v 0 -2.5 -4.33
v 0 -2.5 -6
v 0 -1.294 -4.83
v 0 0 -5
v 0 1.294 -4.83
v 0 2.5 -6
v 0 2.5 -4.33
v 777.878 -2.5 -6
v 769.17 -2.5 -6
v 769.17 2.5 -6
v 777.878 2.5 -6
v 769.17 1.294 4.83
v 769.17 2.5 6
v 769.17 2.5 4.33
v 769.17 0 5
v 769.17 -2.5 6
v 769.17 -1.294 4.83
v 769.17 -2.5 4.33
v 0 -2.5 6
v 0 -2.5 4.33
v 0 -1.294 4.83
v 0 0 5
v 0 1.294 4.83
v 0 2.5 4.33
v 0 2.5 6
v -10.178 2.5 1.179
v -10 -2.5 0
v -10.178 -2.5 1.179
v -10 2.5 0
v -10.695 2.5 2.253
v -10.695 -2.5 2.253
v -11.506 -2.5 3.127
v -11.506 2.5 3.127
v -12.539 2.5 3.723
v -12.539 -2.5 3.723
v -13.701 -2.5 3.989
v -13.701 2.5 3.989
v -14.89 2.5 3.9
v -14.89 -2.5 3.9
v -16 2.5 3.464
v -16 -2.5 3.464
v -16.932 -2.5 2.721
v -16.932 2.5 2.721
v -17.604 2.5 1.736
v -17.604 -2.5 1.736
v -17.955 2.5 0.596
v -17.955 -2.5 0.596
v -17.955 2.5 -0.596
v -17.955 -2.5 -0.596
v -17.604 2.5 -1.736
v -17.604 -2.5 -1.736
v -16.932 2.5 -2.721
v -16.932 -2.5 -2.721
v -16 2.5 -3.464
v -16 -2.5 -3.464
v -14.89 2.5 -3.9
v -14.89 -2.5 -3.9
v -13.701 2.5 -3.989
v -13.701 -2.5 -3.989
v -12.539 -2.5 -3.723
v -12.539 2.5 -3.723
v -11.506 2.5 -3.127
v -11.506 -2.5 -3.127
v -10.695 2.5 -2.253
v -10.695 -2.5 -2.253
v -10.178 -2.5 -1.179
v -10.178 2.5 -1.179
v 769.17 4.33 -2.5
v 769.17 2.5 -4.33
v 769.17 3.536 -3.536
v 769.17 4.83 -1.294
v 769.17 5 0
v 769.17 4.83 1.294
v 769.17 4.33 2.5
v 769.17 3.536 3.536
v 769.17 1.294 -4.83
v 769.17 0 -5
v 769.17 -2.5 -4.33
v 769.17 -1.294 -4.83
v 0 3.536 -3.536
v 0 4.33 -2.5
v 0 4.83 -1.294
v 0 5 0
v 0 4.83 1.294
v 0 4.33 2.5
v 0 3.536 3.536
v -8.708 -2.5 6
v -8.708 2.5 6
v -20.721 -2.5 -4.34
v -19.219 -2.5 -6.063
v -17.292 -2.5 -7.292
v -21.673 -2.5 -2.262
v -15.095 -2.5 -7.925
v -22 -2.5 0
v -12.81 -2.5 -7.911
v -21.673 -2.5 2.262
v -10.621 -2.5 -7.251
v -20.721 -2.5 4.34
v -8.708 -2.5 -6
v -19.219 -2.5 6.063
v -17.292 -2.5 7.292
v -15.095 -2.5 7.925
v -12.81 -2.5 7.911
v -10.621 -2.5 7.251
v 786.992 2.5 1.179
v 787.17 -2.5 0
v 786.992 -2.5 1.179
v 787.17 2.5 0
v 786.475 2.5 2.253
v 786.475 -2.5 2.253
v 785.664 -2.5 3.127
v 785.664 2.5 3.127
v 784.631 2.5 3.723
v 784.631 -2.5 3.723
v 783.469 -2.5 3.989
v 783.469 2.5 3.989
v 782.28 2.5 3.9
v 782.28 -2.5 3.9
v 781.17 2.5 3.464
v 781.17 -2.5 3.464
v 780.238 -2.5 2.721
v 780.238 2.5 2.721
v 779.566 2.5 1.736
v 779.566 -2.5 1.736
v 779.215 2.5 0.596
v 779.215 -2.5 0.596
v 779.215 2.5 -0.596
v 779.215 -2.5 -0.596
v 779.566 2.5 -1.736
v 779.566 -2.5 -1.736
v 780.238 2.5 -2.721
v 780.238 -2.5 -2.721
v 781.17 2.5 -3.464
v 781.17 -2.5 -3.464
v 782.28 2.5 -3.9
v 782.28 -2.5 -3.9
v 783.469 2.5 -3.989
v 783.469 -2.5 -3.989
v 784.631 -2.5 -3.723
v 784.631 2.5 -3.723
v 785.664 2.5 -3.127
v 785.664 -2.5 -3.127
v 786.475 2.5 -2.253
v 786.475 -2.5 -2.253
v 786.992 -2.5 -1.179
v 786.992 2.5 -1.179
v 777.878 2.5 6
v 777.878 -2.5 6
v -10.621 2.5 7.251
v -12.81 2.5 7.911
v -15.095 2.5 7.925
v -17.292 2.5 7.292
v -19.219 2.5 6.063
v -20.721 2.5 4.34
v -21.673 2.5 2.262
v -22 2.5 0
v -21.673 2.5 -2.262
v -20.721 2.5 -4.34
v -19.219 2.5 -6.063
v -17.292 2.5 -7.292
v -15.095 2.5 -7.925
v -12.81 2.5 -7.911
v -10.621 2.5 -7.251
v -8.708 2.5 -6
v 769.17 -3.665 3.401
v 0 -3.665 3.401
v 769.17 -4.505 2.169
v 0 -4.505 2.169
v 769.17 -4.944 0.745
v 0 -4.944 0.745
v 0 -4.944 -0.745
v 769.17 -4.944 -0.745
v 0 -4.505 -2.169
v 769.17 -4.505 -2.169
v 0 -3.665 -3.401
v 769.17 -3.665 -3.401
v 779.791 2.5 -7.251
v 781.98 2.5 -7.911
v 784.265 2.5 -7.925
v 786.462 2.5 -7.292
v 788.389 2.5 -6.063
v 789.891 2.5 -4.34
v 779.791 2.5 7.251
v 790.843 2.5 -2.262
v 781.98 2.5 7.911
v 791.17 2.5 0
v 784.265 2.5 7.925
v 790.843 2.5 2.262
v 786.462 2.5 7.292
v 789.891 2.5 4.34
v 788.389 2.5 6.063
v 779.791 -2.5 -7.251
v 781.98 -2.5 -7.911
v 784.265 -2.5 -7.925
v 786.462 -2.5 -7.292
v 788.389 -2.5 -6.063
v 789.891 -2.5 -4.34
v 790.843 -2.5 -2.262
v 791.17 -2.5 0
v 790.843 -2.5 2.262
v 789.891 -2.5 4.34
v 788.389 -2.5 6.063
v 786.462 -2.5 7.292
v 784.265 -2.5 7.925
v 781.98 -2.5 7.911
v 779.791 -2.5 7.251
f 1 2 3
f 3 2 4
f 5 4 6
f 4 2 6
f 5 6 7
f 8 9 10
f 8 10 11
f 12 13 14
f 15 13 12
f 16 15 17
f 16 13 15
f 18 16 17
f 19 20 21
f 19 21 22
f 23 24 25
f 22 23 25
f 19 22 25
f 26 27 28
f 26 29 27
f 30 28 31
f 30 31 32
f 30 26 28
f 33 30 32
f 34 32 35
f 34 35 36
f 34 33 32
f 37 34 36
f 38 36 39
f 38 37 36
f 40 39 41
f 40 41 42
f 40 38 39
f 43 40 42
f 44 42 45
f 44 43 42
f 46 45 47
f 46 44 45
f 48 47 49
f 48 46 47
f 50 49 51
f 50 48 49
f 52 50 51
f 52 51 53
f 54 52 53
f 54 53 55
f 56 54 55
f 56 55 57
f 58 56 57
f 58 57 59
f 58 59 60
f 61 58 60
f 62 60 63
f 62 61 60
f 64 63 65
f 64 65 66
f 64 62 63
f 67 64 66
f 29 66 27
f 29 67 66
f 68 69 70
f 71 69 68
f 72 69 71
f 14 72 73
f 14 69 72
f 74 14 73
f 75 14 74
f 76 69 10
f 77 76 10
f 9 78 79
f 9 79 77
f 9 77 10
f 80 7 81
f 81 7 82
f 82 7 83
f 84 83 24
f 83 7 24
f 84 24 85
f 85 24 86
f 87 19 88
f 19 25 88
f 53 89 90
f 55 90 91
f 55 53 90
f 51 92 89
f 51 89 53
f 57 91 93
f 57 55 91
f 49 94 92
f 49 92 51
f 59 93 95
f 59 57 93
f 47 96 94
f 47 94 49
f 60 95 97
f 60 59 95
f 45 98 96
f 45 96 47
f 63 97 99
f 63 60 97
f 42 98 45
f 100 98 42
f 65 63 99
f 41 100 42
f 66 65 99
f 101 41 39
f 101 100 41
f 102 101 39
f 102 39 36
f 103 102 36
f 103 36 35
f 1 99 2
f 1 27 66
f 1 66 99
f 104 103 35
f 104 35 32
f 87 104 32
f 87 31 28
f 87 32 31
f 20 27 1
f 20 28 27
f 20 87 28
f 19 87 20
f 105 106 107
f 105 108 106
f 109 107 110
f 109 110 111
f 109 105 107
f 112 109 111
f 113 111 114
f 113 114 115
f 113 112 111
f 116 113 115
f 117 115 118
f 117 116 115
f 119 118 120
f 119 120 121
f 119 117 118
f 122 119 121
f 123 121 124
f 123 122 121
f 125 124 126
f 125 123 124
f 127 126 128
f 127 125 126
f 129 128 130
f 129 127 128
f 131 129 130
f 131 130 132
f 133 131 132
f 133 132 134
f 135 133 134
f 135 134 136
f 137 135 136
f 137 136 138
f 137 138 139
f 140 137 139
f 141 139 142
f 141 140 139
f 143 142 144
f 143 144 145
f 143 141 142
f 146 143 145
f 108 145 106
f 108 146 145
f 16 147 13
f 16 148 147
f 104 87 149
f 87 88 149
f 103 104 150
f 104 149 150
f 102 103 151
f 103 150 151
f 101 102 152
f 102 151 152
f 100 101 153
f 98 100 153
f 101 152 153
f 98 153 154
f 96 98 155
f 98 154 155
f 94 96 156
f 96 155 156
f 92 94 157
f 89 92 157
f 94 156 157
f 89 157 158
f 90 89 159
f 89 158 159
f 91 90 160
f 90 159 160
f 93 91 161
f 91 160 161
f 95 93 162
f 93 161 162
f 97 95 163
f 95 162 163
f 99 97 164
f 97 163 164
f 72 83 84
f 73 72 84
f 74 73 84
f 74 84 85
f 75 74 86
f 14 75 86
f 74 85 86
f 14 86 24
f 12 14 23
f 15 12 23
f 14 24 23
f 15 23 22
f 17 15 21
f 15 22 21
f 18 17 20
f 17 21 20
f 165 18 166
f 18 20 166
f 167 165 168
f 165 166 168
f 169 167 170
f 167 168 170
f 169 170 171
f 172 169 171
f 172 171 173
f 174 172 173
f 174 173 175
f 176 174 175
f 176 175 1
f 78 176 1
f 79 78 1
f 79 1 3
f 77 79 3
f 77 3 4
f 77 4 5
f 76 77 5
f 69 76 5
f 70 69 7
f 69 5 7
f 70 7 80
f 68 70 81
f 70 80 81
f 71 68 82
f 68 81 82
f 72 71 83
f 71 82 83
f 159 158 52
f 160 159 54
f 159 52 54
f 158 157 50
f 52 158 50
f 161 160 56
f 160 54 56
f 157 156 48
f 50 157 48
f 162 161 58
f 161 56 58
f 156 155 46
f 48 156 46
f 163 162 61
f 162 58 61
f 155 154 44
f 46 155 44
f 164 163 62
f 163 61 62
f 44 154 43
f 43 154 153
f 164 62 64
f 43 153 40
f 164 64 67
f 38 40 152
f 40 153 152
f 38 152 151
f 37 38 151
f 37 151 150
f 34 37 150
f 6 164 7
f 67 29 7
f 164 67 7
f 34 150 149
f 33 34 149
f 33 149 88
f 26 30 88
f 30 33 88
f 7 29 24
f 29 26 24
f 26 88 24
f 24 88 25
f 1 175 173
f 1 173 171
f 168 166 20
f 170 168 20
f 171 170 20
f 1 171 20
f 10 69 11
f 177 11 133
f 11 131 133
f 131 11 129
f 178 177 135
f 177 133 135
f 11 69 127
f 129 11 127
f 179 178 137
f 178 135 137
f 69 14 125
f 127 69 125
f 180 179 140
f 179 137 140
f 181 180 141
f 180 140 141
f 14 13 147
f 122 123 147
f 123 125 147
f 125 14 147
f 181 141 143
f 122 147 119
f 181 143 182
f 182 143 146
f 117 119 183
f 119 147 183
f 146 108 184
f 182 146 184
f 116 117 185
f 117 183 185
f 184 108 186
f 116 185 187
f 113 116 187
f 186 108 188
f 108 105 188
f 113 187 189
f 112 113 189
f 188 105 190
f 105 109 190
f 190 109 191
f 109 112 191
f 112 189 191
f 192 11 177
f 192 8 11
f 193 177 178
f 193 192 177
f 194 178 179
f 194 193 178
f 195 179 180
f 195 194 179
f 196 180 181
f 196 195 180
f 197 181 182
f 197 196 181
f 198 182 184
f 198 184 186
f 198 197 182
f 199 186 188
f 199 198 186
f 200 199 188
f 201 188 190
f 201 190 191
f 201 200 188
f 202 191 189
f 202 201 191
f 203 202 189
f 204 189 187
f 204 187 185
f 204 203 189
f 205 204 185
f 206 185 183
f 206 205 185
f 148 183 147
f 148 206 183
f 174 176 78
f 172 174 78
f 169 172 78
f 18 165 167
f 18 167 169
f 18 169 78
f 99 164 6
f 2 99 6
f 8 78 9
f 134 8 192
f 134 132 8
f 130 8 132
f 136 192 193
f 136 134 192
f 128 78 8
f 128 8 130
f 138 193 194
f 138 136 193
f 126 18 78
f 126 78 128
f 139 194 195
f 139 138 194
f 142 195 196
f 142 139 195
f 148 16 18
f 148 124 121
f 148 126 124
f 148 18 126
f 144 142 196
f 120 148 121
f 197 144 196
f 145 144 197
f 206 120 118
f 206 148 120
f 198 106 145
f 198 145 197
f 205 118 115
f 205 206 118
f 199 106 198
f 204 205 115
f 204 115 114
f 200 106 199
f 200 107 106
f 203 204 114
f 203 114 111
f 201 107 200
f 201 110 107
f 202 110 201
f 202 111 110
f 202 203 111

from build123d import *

# Parameters (mm, degrees)
F0_R     = 5
F1_DEPTH = 769.17
F2_R     = 4
F3_DEPTH = 2.5


with BuildPart() as f1:
    # F0 (on Right) → F1 (new body)
    with BuildSketch(Plane.YZ):
        Circle(F0_R)
    extrude(amount=F1_DEPTH)

    # F2 (on Front) → F3 (join, symmetric)
    with BuildSketch(Plane.XZ):
        with BuildLine():
            Line((0, -6), (0, 6))
            Line((0, 6), (-8.708497, 6))
            ThreePointArc((-8.708497, 6), (-22, 0), (-8.708497, -6))
            Line((-8.708497, -6), (0, -6))
        make_face()
        with Locations((-14, 0)):
            Circle(F2_R, mode=Mode.SUBTRACT)
        with BuildLine():
            Line((777.878497, 6), (769.17, 6))
            Line((769.17, 6), (769.17, -6))
            Line((769.17, -6), (777.878497, -6))
            ThreePointArc((777.878497, -6), (791.17, 0), (777.878497, 6))
        make_face()
        with Locations((783.17, 0)):
            Circle(F2_R, mode=Mode.SUBTRACT)
    extrude(amount=F3_DEPTH, both=True)


solid = f1.part
